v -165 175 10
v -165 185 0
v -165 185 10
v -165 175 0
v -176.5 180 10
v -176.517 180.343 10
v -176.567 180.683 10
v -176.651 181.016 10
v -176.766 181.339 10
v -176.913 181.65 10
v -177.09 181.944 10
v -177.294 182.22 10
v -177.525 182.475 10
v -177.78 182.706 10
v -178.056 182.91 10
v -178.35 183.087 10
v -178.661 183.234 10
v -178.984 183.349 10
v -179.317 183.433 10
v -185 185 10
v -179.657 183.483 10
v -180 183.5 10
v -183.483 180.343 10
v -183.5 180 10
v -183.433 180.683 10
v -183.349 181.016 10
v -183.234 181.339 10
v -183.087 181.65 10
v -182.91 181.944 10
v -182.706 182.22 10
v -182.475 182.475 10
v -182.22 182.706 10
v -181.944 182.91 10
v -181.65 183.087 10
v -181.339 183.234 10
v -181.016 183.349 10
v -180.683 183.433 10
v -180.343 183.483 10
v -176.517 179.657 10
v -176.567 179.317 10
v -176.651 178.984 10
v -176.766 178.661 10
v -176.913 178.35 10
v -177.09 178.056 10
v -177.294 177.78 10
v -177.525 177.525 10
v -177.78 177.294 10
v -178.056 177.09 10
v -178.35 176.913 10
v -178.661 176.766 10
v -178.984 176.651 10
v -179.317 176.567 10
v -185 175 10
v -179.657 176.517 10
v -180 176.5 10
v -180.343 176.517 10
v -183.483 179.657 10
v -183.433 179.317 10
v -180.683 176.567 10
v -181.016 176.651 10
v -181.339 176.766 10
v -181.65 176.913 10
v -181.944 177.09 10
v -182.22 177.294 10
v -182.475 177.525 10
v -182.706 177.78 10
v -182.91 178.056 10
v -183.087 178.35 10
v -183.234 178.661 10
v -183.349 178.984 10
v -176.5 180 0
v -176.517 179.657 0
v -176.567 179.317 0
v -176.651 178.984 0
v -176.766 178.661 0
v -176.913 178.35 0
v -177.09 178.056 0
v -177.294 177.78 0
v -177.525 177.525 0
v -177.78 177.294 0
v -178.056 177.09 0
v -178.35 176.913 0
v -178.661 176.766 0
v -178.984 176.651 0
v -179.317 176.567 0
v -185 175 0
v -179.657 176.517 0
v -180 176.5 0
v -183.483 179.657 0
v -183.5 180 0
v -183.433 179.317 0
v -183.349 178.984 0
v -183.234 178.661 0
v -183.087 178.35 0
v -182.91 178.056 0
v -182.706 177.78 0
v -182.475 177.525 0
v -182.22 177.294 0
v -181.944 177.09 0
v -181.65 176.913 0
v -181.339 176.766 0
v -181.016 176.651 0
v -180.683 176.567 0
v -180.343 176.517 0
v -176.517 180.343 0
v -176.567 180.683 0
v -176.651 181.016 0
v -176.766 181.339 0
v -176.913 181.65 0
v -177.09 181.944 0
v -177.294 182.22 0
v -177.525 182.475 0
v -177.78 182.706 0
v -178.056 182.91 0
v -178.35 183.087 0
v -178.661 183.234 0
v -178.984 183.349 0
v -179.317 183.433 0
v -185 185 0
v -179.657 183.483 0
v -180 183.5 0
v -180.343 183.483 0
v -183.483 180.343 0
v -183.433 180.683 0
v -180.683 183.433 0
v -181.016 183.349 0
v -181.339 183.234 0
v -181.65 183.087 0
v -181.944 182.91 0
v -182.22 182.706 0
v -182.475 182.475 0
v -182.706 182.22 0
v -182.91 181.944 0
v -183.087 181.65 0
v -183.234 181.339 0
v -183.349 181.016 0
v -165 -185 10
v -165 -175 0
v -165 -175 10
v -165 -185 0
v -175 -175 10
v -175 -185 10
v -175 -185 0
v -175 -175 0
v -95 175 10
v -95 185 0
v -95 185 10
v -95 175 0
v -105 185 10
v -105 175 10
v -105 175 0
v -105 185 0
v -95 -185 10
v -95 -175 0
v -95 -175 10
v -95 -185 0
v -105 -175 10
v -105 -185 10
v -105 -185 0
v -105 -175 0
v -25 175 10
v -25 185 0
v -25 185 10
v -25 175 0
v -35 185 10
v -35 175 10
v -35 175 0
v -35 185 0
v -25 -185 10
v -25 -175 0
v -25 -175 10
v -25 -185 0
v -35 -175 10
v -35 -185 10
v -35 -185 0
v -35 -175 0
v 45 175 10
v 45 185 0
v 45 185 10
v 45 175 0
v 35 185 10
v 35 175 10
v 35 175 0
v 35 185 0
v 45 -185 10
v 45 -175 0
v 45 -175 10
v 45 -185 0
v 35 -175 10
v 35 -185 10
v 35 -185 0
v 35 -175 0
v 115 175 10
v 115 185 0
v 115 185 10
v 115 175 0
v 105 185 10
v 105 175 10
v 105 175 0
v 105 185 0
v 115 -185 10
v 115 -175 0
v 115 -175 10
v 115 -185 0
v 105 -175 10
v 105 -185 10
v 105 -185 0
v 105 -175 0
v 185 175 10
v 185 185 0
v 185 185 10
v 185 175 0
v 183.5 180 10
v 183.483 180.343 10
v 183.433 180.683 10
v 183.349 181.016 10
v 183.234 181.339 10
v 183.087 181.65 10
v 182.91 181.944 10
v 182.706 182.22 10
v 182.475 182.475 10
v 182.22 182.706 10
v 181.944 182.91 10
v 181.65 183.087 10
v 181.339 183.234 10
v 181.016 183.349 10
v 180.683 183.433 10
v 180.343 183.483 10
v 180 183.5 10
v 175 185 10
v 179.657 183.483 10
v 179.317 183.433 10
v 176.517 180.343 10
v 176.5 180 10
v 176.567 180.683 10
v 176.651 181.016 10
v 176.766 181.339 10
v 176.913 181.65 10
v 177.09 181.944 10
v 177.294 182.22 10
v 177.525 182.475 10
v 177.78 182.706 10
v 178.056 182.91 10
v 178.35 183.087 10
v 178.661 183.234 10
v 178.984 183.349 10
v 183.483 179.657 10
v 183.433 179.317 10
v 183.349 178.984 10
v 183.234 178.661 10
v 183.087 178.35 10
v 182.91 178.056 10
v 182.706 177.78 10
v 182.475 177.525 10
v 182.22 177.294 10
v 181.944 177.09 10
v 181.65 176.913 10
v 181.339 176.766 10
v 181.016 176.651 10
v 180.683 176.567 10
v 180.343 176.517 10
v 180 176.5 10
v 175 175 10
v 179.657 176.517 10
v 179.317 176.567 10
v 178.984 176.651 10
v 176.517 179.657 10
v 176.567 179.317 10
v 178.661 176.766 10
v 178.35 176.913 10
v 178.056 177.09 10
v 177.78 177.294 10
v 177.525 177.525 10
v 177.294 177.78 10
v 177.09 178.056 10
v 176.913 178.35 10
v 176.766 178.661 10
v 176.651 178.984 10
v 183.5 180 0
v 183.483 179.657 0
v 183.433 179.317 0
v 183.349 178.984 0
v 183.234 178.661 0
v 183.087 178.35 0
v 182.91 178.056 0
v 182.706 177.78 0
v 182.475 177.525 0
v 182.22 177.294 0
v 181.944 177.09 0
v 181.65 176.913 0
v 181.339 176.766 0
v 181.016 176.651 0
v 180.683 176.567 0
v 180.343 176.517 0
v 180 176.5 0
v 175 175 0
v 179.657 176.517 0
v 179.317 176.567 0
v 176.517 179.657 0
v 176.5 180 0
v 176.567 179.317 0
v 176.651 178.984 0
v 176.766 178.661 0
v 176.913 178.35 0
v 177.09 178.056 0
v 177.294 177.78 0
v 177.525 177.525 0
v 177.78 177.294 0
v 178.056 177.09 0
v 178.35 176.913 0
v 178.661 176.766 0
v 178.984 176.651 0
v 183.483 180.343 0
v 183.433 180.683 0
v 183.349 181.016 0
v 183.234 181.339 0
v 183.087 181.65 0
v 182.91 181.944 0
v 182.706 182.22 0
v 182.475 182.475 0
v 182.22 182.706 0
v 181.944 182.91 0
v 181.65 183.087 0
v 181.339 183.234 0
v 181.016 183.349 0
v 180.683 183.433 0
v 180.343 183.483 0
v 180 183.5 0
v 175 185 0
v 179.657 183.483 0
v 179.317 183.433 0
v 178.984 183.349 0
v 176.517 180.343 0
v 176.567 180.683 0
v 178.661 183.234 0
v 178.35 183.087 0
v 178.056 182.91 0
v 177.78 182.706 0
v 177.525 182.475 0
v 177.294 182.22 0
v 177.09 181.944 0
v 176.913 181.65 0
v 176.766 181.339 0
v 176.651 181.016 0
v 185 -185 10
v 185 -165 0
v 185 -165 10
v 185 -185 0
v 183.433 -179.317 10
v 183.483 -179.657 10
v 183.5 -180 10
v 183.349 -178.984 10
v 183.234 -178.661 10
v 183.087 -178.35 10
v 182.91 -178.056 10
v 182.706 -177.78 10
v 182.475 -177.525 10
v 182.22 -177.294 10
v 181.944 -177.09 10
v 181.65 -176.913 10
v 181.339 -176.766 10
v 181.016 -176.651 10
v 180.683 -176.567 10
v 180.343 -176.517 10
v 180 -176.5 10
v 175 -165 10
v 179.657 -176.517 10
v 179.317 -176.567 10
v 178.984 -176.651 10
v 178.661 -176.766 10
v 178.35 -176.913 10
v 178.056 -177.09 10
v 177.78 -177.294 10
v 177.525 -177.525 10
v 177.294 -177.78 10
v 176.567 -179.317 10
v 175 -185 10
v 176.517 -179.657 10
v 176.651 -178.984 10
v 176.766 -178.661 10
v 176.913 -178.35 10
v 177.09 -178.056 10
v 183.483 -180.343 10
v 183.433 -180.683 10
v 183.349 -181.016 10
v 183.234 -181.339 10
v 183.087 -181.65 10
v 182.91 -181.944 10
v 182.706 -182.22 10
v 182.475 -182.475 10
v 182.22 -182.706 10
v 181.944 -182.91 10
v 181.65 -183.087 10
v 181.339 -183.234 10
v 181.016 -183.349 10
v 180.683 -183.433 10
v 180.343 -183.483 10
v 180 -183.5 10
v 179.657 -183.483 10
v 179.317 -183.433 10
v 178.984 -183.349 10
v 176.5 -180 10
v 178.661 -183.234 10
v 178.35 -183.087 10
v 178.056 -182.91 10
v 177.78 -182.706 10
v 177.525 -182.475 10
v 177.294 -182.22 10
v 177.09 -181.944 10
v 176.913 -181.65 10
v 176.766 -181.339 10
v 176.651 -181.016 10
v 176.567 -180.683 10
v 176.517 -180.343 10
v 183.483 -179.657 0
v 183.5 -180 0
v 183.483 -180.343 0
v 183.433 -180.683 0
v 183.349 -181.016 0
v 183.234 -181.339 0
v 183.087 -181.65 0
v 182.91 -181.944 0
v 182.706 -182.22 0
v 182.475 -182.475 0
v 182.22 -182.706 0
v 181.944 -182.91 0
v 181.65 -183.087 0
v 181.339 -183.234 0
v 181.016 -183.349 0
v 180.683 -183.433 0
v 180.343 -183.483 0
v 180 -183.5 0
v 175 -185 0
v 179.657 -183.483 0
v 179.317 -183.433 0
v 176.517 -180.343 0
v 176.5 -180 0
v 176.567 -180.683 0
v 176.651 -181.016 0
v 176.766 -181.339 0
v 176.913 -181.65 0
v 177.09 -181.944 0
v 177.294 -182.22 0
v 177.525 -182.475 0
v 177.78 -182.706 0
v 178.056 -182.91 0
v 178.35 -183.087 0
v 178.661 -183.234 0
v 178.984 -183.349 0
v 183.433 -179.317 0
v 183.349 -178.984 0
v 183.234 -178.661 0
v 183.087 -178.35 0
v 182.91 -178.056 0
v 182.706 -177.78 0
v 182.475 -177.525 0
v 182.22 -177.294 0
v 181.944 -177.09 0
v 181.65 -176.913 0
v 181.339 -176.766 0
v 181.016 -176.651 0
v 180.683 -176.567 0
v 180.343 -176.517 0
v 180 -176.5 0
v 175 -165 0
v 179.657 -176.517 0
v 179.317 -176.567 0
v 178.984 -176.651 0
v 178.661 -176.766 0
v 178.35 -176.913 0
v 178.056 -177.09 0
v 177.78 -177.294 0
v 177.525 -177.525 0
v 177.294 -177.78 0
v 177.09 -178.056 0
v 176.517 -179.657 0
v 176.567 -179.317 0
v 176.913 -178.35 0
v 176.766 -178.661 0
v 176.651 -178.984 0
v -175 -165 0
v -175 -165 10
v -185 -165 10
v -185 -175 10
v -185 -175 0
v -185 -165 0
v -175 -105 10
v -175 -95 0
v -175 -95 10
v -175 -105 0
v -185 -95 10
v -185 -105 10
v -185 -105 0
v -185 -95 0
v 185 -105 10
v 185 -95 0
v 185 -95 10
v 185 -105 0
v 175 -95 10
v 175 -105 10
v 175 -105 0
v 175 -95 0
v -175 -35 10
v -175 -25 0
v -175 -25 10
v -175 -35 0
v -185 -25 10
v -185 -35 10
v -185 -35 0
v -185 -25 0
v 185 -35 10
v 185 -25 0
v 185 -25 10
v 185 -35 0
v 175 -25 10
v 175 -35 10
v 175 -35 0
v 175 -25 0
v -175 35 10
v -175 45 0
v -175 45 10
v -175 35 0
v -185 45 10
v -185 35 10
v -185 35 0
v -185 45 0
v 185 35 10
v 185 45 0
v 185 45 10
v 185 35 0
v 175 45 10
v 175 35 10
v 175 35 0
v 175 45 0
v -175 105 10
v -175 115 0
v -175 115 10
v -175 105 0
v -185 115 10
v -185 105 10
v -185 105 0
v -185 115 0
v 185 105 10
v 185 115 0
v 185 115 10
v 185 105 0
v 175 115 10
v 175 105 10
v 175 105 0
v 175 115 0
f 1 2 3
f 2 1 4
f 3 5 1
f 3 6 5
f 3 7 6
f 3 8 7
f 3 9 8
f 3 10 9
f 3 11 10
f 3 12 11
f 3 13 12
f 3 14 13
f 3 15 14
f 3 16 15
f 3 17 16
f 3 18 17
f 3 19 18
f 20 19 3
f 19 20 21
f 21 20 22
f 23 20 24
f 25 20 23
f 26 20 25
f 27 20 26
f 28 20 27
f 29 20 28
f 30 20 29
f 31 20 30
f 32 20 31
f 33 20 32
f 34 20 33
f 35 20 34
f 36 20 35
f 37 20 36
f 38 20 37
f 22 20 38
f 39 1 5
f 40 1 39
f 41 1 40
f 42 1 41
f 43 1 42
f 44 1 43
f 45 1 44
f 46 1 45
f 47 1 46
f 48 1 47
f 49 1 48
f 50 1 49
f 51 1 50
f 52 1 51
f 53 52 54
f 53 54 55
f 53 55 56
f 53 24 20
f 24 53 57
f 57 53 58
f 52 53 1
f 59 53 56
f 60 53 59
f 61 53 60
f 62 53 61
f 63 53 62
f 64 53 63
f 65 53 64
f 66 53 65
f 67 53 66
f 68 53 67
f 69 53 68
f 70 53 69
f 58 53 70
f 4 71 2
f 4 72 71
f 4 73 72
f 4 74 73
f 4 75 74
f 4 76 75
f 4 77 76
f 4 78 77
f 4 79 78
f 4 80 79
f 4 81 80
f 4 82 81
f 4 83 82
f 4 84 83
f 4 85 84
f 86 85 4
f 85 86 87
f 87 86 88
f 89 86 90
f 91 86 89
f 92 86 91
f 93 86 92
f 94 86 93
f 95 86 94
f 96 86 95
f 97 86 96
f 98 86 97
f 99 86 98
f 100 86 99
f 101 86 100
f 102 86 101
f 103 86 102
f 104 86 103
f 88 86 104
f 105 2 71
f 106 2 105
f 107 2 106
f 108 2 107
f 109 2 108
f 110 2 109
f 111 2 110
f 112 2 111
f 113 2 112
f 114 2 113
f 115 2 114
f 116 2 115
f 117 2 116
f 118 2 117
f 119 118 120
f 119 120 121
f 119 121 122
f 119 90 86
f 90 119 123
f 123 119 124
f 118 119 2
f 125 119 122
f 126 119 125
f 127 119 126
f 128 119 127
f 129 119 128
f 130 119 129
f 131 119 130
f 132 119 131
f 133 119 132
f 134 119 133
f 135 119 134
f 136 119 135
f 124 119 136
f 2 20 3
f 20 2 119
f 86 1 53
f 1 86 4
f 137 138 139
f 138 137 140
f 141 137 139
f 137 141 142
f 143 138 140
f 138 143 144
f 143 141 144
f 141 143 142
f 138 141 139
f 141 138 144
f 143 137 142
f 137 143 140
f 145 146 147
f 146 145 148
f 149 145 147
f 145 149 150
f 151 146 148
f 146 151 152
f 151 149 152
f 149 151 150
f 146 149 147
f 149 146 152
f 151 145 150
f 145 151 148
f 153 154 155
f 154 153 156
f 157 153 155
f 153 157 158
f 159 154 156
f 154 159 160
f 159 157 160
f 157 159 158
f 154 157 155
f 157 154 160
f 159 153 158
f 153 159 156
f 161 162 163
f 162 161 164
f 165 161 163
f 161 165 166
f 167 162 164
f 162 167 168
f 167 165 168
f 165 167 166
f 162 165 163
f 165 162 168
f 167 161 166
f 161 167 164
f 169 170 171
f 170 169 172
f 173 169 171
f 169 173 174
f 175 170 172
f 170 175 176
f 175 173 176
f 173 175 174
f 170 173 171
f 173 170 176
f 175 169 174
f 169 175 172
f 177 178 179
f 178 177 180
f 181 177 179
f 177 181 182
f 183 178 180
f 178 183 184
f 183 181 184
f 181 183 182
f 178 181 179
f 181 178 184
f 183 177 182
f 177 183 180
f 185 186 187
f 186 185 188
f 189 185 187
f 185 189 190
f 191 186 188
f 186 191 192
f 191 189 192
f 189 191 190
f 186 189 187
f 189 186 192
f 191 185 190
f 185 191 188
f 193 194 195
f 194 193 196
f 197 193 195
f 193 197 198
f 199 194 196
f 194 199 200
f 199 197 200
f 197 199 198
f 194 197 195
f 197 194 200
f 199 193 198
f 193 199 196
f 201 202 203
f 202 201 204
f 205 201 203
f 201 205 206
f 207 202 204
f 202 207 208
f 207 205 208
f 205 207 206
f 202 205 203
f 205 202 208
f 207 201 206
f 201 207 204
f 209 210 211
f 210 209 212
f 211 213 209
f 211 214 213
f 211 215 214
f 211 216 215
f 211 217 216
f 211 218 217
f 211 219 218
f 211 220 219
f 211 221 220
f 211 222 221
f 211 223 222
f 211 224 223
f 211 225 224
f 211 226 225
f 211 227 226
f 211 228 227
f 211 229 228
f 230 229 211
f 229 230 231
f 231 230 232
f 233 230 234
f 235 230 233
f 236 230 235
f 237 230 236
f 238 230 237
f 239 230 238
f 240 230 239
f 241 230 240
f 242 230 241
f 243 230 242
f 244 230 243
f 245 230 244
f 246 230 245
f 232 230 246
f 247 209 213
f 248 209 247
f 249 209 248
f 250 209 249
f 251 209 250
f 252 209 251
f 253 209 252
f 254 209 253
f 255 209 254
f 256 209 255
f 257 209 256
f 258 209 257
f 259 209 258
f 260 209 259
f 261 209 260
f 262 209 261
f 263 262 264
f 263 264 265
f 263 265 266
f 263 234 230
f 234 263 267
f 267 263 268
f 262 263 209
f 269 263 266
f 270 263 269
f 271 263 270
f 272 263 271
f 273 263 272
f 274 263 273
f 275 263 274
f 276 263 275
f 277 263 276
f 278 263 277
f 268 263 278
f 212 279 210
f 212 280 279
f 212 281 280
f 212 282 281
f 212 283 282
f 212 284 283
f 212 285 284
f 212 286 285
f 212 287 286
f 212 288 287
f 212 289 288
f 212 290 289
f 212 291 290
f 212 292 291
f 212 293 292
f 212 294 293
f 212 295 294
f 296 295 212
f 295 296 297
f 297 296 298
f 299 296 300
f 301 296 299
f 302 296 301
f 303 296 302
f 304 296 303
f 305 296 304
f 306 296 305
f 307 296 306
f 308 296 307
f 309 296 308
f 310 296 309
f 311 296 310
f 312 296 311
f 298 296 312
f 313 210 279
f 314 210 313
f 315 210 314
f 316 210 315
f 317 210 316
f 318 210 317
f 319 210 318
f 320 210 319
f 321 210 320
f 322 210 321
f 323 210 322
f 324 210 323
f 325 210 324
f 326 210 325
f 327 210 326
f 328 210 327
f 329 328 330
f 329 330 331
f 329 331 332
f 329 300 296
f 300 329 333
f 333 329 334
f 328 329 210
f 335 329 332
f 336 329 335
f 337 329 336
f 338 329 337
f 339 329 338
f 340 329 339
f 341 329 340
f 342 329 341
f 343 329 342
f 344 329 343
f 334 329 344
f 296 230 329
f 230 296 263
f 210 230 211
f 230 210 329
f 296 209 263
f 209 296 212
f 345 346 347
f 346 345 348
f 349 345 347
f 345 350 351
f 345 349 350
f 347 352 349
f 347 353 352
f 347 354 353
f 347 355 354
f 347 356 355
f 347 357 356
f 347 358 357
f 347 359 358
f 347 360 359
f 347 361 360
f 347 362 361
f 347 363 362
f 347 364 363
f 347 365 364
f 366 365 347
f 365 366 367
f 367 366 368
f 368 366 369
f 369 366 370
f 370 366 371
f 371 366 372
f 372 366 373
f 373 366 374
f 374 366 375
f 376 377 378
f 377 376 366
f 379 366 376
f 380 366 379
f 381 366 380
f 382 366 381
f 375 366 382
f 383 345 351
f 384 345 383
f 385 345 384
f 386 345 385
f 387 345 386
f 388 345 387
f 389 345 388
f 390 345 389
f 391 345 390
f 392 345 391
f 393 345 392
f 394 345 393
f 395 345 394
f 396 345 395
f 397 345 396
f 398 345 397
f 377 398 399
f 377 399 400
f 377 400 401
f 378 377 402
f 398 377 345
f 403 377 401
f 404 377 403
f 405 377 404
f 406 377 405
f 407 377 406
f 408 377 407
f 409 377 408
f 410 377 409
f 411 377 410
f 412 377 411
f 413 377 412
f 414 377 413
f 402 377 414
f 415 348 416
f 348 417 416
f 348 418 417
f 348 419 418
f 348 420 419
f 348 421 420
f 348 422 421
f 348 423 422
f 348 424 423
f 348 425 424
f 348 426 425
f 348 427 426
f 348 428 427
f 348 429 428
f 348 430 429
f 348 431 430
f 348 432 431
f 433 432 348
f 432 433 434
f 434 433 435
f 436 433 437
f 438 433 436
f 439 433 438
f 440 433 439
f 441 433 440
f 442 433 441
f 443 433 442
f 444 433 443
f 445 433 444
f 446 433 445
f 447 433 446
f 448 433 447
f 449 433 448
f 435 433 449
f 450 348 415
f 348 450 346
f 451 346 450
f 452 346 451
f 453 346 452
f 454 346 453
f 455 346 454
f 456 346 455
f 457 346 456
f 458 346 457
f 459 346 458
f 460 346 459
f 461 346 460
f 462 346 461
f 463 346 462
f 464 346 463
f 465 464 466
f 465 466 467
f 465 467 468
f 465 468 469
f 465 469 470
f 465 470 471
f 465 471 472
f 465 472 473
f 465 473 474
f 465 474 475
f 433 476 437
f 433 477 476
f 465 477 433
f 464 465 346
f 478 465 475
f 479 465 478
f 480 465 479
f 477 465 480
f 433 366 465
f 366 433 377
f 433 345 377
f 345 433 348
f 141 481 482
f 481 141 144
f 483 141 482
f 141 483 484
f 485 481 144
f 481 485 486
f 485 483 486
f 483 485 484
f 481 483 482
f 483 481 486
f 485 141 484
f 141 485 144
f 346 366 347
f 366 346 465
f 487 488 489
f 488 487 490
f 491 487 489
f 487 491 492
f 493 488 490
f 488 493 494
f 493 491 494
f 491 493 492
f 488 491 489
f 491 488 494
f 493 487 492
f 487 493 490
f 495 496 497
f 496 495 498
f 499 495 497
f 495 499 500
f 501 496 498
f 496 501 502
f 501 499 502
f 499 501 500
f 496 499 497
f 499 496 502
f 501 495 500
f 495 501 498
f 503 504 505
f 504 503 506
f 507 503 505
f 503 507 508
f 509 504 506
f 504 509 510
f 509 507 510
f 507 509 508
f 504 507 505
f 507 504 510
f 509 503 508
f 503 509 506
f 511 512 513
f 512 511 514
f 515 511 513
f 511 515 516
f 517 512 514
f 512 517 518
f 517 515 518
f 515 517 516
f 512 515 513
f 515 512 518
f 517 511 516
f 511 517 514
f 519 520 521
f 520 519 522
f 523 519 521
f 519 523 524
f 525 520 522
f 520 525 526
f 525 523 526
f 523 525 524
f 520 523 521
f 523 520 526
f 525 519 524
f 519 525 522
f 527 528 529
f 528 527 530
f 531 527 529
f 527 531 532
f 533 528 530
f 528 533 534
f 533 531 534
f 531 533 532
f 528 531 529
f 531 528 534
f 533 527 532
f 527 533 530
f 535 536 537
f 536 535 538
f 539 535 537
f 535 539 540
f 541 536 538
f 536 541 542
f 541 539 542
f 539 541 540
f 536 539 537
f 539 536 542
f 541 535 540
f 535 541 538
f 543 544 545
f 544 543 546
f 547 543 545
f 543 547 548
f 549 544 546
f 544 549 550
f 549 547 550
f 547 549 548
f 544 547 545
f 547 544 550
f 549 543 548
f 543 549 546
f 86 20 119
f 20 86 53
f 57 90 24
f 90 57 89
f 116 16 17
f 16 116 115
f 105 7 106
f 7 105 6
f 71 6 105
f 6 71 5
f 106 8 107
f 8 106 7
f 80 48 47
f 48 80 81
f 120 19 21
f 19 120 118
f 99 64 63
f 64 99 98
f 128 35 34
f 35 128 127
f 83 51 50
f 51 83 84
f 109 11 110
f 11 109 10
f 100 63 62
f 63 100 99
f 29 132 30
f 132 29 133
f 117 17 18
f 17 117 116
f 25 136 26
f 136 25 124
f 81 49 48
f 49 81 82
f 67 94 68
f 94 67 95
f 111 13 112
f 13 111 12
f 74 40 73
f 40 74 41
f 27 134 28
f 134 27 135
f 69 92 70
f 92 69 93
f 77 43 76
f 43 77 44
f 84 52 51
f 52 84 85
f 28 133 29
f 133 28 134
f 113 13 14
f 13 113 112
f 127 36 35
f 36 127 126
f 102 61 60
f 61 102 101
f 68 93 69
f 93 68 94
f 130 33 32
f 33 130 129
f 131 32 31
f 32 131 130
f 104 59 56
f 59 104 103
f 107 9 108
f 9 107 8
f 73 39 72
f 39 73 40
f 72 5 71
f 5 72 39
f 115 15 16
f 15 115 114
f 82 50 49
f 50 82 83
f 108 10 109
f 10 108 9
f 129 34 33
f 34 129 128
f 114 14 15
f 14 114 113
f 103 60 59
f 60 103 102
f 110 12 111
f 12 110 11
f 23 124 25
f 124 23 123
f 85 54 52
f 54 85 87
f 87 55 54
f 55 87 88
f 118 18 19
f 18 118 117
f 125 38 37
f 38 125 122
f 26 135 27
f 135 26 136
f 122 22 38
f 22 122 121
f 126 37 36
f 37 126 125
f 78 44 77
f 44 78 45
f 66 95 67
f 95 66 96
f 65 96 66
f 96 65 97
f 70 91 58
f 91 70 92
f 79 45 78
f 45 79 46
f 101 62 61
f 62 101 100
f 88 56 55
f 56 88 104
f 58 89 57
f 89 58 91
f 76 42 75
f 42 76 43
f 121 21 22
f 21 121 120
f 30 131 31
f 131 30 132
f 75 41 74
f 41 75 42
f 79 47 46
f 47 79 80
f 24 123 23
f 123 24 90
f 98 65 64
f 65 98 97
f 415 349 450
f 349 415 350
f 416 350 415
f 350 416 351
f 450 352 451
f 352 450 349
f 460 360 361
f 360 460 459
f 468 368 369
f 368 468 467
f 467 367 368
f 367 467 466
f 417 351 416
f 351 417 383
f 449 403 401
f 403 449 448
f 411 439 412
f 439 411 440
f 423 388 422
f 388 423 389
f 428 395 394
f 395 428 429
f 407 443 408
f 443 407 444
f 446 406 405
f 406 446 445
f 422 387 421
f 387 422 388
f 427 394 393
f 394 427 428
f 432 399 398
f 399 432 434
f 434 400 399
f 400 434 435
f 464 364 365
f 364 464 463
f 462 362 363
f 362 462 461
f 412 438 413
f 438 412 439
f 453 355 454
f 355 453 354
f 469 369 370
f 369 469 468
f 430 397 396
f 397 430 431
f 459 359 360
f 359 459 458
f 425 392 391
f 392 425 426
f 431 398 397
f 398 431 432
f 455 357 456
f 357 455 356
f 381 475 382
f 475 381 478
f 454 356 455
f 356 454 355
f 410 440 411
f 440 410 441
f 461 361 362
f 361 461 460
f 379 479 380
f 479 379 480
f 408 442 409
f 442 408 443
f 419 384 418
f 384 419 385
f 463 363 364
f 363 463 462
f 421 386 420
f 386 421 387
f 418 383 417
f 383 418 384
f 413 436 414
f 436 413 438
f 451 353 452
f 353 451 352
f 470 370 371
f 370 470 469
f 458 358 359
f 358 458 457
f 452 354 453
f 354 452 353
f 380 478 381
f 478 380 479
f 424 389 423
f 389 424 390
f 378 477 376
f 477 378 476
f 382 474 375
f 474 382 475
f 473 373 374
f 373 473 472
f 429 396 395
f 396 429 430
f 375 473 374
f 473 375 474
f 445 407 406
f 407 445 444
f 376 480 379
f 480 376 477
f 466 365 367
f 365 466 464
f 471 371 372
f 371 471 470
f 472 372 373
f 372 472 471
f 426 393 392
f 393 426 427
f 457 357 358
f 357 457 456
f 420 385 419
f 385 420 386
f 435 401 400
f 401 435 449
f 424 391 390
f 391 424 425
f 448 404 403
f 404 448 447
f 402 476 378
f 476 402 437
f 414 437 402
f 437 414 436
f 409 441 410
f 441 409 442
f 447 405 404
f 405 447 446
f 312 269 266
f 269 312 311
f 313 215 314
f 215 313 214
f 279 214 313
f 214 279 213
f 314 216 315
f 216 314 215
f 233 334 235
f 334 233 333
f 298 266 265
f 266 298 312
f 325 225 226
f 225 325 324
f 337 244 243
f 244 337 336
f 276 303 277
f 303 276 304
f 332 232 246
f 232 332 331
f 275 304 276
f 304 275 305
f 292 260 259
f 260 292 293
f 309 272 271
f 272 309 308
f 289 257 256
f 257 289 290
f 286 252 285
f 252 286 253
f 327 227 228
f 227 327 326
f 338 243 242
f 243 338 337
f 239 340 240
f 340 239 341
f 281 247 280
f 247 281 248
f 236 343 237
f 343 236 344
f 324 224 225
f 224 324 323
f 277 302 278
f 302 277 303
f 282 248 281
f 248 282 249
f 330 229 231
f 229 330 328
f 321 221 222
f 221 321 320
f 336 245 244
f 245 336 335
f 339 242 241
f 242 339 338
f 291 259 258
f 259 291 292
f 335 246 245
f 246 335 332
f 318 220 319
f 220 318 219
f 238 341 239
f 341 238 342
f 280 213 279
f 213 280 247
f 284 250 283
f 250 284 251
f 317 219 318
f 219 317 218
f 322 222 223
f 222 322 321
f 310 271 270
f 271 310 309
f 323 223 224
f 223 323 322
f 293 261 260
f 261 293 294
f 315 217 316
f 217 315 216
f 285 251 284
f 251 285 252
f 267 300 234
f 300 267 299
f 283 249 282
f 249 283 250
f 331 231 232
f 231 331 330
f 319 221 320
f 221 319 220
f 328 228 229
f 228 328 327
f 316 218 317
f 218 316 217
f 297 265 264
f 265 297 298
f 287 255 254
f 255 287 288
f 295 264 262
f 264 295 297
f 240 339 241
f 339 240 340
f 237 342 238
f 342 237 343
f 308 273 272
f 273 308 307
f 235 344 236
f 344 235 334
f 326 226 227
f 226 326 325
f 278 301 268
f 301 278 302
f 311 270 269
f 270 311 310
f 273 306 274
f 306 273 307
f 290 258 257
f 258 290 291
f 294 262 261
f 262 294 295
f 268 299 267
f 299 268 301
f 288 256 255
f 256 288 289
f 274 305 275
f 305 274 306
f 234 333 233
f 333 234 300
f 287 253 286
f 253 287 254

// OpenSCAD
// ring_06.scad - ring index 6 (z bottom = 60 mm)
$fn = 64; bar = 10; half_b = bar/2; outer = 370; half_outer = outer/2;
front_y = 180; back_y = -180; left_x = -180; right_x = 180;
x_centers = [-170, -100, -30, 40, 110, 180];
z_centers = [5, 85, 155, 225, 295, 365, 435, 505, 575, 645, 715]; ring_z = 60;
module place_box(cx, cy, sx, sy) { translate([cx - sx/2, cy - sy/2, 0]) cube([sx, sy, bar]); }

difference() { union() {
    for (x = x_centers) { place_box(x, front_y, bar, bar); place_box(x, back_y, bar, bar); }
    for (y = x_centers) { place_box(left_x, y, bar, bar); place_box(right_x, y, bar, bar); }
    for (zc = z_centers) if ((zc - half_b < ring_z + bar) && (zc + half_b > ring_z)) {
        translate([-half_outer, front_y - half_b, 0]) cube([outer, bar, bar]);
        translate([-half_outer, back_y - half_b, 0])  cube([outer, bar, bar]);
        translate([left_x - half_b, -half_outer, 0])  cube([bar, outer, bar]);
        translate([right_x - half_b, -half_outer, 0]) cube([bar, outer, bar]);
    }
  }
  for (cx = [-180, 180]) for (cy = [-180, 180]) translate([cx, cy, 0]) cylinder(h = bar, r = 3.5, $fn = 64);
}
